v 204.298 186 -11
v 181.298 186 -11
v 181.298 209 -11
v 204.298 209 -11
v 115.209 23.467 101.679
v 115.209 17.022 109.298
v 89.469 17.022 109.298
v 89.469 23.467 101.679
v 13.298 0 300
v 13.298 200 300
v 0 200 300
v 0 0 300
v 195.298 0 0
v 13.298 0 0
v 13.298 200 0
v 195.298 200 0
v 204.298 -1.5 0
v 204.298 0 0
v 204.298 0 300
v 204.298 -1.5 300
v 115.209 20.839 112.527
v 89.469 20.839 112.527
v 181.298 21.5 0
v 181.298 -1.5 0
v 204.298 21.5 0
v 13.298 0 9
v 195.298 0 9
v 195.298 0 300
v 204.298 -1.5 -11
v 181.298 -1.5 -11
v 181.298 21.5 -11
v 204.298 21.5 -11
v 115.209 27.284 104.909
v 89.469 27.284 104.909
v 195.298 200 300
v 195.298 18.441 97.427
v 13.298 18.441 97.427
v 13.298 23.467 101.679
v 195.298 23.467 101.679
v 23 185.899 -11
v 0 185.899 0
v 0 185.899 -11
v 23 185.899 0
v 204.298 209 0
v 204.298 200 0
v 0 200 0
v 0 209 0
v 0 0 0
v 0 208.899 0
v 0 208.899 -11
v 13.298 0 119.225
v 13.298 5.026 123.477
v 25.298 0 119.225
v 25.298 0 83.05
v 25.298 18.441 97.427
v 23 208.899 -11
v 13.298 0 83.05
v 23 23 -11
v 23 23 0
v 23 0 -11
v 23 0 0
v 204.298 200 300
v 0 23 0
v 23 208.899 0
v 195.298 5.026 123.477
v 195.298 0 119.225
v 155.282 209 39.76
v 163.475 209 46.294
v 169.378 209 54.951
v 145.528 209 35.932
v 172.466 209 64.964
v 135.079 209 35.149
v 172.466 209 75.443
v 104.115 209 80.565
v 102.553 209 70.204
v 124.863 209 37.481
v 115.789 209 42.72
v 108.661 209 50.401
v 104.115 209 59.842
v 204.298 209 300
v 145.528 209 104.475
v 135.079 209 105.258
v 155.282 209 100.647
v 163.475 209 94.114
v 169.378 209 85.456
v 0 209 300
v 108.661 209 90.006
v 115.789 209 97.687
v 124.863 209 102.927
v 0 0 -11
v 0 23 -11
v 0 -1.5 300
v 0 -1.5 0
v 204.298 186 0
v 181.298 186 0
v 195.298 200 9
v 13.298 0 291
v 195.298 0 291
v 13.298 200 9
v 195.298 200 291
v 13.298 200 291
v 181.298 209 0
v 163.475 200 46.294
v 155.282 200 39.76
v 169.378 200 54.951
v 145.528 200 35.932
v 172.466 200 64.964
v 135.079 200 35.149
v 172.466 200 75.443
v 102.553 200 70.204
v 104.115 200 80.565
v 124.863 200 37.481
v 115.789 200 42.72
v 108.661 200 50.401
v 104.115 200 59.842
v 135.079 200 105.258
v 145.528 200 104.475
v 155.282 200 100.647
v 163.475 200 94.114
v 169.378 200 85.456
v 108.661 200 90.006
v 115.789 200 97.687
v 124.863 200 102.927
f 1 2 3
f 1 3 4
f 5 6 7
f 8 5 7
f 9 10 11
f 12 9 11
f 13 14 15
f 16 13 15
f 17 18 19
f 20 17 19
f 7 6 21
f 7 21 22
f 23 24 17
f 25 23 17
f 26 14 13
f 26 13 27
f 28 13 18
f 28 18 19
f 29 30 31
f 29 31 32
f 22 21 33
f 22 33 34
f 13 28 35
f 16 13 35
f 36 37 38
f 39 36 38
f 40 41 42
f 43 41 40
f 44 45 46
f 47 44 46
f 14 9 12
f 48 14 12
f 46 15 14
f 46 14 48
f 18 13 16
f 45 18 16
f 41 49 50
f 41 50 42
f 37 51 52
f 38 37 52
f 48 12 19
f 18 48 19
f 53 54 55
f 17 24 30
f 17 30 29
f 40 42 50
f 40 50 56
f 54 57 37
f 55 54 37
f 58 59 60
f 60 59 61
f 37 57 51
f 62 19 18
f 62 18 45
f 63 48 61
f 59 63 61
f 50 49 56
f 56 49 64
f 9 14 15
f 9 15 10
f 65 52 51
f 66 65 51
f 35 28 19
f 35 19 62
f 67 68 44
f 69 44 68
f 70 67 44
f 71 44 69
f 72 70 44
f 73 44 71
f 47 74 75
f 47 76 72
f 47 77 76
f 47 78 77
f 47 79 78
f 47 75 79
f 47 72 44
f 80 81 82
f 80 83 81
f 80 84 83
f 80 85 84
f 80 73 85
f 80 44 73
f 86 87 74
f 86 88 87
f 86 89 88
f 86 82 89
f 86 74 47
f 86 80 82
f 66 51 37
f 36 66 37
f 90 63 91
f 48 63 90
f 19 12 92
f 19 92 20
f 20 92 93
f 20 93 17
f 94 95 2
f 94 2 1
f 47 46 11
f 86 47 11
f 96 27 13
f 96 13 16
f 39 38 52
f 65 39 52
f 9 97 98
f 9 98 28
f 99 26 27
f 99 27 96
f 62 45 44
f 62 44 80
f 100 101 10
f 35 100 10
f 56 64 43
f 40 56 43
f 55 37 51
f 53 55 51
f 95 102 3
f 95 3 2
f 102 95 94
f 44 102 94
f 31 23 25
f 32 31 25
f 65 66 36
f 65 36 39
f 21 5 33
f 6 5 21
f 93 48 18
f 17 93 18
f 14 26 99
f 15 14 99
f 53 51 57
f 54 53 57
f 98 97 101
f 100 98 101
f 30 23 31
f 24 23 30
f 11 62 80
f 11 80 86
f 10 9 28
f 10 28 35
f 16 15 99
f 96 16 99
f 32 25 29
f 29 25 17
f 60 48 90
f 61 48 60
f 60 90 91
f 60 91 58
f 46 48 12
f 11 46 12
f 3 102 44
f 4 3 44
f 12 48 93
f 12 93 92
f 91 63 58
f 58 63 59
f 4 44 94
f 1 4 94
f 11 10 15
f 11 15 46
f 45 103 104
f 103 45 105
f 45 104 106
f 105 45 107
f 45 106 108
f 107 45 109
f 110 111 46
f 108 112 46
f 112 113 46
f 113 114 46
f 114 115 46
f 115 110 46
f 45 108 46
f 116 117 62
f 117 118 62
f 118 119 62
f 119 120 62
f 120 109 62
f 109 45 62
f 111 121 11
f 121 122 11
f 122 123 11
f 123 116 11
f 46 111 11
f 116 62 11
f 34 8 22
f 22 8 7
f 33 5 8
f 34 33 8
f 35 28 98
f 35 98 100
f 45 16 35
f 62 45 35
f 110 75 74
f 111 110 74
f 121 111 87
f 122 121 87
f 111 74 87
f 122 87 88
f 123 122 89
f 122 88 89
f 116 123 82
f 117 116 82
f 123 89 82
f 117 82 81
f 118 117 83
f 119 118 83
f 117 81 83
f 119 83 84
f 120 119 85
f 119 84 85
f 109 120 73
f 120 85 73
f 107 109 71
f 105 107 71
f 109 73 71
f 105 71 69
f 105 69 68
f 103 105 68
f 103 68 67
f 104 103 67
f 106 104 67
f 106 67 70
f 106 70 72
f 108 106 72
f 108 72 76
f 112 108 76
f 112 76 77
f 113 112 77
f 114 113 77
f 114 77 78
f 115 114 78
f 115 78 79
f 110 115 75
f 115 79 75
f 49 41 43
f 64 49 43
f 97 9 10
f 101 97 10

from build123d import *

# Parameters (mm, degrees)
F0_W      = 204.298
F0_H      = 300
F1_DEPTH  = 1.5
F2_W      = 13.2981073111
F2_H      = 300
F3_DEPTH  = 200
F5_DEPTH  = 12
F7_DEPTH  = 182
F8_W      = 25.7398411632
F8_H      = 9.9793898548
F9_DEPTH  = 5
F10_W     = 200
F10_H     = 9
F11_DEPTH = 182
F12_W     = 200
F12_H     = 9
F13_DEPTH = 182
F14_W     = 200
F14_H     = 300
F15_DEPTH = 9
F16_W     = 204.2981073111
F16_H     = 300
F17_DEPTH = 9
F18_R     = 35.1528640542
F19_DEPTH = 9
F20_DEPTH = 25
F21_W     = 23
F21_H     = 23
F22_DEPTH = 11
F23_W     = 23
F23_H     = 23
F24_DEPTH = 11
F25_W     = 23
F25_H     = 23
F26_DEPTH = 11
F27_W     = 23
F27_H     = 23
F28_DEPTH = 11


with BuildPart() as f1:
    # F0 (on Front) → F1 (new body)
    with BuildSketch(Plane.XZ):
        with Locations((102.149, 150)):
            Rectangle(F0_W, F0_H)
    extrude(amount=F1_DEPTH)

    # F18 (on face) → F20 (cut)
    with BuildSketch(Plane(origin=(0, 209, 0), x_dir=(-1, 0, 0), z_dir=(0, 1, 0))):
        with Locations((-137.7060115337, 70.2037215233)):
            Circle(F18_R)
    extrude(amount=-F20_DEPTH, mode=Mode.SUBTRACT)


with BuildPart() as f3:
    # F2 (on face) → F3 (new body)
    with BuildSketch(Plane(origin=(0, 0, 0), x_dir=(-1, 0, 0), z_dir=(0, 1, 0))):
        with Locations((-6.6490536556, 150)):
            Rectangle(F2_W, F2_H)
    extrude(amount=F3_DEPTH)


with BuildPart() as f5:
    # F4 (on face) → F5 (new body)
    with BuildSketch(Plane.YZ.offset(13.2981073111)):
        Polygon((18.4408109635, 97.4271222949), (0, 119.2248314619), (0, 83.049915731), align=None)
    extrude(amount=F5_DEPTH)


with BuildPart() as f7:
    # F6 (on face) → F7 (new body)
    with BuildSketch(Plane.YZ.offset(13.2981073111)):
        Polygon((0, 119.2248314619), (18.4408109635, 97.4271222949), (23.4669872274, 101.6792556563), (5.0261762638, 123.4769648233), align=None)
    extrude(amount=F7_DEPTH)


with BuildPart() as f9:
    # F8 (on face) → F9 (new body)
    with BuildSketch(Plane(origin=(0, 63.8145545289, 53.9869638489), x_dir=(-1, 0, 0), z_dir=(0, 0.7634450794, 0.6458727512))):
        with Locations((-102.3391224444, 67.4595347302)):
            Rectangle(F8_W, F8_H)
    extrude(amount=F9_DEPTH)


with BuildPart() as f11:
    # F10 (on face) → F11 (new body)
    with BuildSketch(Plane.YZ.offset(13.2981073111)):
        with Locations((100, 295.5)):
            Rectangle(F10_W, F10_H)
    extrude(amount=F11_DEPTH)


with BuildPart() as f13:
    # F12 (on face) → F13 (new body)
    with BuildSketch(Plane.YZ.offset(13.2981073111)):
        with Locations((100, 4.5)):
            Rectangle(F12_W, F12_H)
    extrude(amount=F13_DEPTH)


with BuildPart() as f15:
    # F14 (on face) → F15 (new body)
    with BuildSketch(Plane.YZ.offset(195.2981073111)):
        with Locations((100, 150)):
            Rectangle(F14_W, F14_H)
    extrude(amount=F15_DEPTH)


with BuildPart() as f17:
    # F16 (on face) → F17 (new body)
    with BuildSketch(Plane(origin=(0, 200, 0), x_dir=(-1, 0, 0), z_dir=(0, 1, 0))):
        with Locations((-102.1490536556, 150)):
            Rectangle(F16_W, F16_H)
    extrude(amount=F17_DEPTH)

    # F18 (on face) → F19 (cut)
    with BuildSketch(Plane(origin=(0, 209, 0), x_dir=(-1, 0, 0), z_dir=(0, 1, 0))):
        with Locations((-137.7060115337, 70.2037215233)):
            Circle(F18_R)
    extrude(amount=-F19_DEPTH, mode=Mode.SUBTRACT)


with BuildPart() as f22:
    # F21 (on face) → F22 (new body)
    with BuildSketch(Plane(origin=(0, 0, 0), x_dir=(1, 0, 0), z_dir=(0, 0, -1))):
        with Locations((192.7981073111, -197.5)):
            Rectangle(F21_W, F21_H)
    extrude(amount=F22_DEPTH)


with BuildPart() as f24:
    # F23 (on face) → F24 (new body)
    with BuildSketch(Plane(origin=(0, 0, 0), x_dir=(1, 0, 0), z_dir=(0, 0, -1))):
        with Locations((11.5, -197.3994979858)):
            Rectangle(F23_W, F23_H)
    extrude(amount=F24_DEPTH)


with BuildPart() as f26:
    # F25 (on face) → F26 (new body)
    with BuildSketch(Plane(origin=(0, 0, 0), x_dir=(1, 0, 0), z_dir=(0, 0, -1))):
        with Locations((11.5, -11.5)):
            Rectangle(F25_W, F25_H)
    extrude(amount=F26_DEPTH)


with BuildPart() as f28:
    # F27 (on face) → F28 (new body)
    with BuildSketch(Plane(origin=(0, 0, 0), x_dir=(1, 0, 0), z_dir=(0, 0, -1))):
        with Locations((192.798, -10)):
            Rectangle(F27_W, F27_H)
    extrude(amount=F28_DEPTH)


solid = Compound([f1.part, f3.part, f5.part, f7.part, f9.part, f11.part, f13.part, f15.part, f17.part, f22.part, f24.part, f26.part, f28.part])
